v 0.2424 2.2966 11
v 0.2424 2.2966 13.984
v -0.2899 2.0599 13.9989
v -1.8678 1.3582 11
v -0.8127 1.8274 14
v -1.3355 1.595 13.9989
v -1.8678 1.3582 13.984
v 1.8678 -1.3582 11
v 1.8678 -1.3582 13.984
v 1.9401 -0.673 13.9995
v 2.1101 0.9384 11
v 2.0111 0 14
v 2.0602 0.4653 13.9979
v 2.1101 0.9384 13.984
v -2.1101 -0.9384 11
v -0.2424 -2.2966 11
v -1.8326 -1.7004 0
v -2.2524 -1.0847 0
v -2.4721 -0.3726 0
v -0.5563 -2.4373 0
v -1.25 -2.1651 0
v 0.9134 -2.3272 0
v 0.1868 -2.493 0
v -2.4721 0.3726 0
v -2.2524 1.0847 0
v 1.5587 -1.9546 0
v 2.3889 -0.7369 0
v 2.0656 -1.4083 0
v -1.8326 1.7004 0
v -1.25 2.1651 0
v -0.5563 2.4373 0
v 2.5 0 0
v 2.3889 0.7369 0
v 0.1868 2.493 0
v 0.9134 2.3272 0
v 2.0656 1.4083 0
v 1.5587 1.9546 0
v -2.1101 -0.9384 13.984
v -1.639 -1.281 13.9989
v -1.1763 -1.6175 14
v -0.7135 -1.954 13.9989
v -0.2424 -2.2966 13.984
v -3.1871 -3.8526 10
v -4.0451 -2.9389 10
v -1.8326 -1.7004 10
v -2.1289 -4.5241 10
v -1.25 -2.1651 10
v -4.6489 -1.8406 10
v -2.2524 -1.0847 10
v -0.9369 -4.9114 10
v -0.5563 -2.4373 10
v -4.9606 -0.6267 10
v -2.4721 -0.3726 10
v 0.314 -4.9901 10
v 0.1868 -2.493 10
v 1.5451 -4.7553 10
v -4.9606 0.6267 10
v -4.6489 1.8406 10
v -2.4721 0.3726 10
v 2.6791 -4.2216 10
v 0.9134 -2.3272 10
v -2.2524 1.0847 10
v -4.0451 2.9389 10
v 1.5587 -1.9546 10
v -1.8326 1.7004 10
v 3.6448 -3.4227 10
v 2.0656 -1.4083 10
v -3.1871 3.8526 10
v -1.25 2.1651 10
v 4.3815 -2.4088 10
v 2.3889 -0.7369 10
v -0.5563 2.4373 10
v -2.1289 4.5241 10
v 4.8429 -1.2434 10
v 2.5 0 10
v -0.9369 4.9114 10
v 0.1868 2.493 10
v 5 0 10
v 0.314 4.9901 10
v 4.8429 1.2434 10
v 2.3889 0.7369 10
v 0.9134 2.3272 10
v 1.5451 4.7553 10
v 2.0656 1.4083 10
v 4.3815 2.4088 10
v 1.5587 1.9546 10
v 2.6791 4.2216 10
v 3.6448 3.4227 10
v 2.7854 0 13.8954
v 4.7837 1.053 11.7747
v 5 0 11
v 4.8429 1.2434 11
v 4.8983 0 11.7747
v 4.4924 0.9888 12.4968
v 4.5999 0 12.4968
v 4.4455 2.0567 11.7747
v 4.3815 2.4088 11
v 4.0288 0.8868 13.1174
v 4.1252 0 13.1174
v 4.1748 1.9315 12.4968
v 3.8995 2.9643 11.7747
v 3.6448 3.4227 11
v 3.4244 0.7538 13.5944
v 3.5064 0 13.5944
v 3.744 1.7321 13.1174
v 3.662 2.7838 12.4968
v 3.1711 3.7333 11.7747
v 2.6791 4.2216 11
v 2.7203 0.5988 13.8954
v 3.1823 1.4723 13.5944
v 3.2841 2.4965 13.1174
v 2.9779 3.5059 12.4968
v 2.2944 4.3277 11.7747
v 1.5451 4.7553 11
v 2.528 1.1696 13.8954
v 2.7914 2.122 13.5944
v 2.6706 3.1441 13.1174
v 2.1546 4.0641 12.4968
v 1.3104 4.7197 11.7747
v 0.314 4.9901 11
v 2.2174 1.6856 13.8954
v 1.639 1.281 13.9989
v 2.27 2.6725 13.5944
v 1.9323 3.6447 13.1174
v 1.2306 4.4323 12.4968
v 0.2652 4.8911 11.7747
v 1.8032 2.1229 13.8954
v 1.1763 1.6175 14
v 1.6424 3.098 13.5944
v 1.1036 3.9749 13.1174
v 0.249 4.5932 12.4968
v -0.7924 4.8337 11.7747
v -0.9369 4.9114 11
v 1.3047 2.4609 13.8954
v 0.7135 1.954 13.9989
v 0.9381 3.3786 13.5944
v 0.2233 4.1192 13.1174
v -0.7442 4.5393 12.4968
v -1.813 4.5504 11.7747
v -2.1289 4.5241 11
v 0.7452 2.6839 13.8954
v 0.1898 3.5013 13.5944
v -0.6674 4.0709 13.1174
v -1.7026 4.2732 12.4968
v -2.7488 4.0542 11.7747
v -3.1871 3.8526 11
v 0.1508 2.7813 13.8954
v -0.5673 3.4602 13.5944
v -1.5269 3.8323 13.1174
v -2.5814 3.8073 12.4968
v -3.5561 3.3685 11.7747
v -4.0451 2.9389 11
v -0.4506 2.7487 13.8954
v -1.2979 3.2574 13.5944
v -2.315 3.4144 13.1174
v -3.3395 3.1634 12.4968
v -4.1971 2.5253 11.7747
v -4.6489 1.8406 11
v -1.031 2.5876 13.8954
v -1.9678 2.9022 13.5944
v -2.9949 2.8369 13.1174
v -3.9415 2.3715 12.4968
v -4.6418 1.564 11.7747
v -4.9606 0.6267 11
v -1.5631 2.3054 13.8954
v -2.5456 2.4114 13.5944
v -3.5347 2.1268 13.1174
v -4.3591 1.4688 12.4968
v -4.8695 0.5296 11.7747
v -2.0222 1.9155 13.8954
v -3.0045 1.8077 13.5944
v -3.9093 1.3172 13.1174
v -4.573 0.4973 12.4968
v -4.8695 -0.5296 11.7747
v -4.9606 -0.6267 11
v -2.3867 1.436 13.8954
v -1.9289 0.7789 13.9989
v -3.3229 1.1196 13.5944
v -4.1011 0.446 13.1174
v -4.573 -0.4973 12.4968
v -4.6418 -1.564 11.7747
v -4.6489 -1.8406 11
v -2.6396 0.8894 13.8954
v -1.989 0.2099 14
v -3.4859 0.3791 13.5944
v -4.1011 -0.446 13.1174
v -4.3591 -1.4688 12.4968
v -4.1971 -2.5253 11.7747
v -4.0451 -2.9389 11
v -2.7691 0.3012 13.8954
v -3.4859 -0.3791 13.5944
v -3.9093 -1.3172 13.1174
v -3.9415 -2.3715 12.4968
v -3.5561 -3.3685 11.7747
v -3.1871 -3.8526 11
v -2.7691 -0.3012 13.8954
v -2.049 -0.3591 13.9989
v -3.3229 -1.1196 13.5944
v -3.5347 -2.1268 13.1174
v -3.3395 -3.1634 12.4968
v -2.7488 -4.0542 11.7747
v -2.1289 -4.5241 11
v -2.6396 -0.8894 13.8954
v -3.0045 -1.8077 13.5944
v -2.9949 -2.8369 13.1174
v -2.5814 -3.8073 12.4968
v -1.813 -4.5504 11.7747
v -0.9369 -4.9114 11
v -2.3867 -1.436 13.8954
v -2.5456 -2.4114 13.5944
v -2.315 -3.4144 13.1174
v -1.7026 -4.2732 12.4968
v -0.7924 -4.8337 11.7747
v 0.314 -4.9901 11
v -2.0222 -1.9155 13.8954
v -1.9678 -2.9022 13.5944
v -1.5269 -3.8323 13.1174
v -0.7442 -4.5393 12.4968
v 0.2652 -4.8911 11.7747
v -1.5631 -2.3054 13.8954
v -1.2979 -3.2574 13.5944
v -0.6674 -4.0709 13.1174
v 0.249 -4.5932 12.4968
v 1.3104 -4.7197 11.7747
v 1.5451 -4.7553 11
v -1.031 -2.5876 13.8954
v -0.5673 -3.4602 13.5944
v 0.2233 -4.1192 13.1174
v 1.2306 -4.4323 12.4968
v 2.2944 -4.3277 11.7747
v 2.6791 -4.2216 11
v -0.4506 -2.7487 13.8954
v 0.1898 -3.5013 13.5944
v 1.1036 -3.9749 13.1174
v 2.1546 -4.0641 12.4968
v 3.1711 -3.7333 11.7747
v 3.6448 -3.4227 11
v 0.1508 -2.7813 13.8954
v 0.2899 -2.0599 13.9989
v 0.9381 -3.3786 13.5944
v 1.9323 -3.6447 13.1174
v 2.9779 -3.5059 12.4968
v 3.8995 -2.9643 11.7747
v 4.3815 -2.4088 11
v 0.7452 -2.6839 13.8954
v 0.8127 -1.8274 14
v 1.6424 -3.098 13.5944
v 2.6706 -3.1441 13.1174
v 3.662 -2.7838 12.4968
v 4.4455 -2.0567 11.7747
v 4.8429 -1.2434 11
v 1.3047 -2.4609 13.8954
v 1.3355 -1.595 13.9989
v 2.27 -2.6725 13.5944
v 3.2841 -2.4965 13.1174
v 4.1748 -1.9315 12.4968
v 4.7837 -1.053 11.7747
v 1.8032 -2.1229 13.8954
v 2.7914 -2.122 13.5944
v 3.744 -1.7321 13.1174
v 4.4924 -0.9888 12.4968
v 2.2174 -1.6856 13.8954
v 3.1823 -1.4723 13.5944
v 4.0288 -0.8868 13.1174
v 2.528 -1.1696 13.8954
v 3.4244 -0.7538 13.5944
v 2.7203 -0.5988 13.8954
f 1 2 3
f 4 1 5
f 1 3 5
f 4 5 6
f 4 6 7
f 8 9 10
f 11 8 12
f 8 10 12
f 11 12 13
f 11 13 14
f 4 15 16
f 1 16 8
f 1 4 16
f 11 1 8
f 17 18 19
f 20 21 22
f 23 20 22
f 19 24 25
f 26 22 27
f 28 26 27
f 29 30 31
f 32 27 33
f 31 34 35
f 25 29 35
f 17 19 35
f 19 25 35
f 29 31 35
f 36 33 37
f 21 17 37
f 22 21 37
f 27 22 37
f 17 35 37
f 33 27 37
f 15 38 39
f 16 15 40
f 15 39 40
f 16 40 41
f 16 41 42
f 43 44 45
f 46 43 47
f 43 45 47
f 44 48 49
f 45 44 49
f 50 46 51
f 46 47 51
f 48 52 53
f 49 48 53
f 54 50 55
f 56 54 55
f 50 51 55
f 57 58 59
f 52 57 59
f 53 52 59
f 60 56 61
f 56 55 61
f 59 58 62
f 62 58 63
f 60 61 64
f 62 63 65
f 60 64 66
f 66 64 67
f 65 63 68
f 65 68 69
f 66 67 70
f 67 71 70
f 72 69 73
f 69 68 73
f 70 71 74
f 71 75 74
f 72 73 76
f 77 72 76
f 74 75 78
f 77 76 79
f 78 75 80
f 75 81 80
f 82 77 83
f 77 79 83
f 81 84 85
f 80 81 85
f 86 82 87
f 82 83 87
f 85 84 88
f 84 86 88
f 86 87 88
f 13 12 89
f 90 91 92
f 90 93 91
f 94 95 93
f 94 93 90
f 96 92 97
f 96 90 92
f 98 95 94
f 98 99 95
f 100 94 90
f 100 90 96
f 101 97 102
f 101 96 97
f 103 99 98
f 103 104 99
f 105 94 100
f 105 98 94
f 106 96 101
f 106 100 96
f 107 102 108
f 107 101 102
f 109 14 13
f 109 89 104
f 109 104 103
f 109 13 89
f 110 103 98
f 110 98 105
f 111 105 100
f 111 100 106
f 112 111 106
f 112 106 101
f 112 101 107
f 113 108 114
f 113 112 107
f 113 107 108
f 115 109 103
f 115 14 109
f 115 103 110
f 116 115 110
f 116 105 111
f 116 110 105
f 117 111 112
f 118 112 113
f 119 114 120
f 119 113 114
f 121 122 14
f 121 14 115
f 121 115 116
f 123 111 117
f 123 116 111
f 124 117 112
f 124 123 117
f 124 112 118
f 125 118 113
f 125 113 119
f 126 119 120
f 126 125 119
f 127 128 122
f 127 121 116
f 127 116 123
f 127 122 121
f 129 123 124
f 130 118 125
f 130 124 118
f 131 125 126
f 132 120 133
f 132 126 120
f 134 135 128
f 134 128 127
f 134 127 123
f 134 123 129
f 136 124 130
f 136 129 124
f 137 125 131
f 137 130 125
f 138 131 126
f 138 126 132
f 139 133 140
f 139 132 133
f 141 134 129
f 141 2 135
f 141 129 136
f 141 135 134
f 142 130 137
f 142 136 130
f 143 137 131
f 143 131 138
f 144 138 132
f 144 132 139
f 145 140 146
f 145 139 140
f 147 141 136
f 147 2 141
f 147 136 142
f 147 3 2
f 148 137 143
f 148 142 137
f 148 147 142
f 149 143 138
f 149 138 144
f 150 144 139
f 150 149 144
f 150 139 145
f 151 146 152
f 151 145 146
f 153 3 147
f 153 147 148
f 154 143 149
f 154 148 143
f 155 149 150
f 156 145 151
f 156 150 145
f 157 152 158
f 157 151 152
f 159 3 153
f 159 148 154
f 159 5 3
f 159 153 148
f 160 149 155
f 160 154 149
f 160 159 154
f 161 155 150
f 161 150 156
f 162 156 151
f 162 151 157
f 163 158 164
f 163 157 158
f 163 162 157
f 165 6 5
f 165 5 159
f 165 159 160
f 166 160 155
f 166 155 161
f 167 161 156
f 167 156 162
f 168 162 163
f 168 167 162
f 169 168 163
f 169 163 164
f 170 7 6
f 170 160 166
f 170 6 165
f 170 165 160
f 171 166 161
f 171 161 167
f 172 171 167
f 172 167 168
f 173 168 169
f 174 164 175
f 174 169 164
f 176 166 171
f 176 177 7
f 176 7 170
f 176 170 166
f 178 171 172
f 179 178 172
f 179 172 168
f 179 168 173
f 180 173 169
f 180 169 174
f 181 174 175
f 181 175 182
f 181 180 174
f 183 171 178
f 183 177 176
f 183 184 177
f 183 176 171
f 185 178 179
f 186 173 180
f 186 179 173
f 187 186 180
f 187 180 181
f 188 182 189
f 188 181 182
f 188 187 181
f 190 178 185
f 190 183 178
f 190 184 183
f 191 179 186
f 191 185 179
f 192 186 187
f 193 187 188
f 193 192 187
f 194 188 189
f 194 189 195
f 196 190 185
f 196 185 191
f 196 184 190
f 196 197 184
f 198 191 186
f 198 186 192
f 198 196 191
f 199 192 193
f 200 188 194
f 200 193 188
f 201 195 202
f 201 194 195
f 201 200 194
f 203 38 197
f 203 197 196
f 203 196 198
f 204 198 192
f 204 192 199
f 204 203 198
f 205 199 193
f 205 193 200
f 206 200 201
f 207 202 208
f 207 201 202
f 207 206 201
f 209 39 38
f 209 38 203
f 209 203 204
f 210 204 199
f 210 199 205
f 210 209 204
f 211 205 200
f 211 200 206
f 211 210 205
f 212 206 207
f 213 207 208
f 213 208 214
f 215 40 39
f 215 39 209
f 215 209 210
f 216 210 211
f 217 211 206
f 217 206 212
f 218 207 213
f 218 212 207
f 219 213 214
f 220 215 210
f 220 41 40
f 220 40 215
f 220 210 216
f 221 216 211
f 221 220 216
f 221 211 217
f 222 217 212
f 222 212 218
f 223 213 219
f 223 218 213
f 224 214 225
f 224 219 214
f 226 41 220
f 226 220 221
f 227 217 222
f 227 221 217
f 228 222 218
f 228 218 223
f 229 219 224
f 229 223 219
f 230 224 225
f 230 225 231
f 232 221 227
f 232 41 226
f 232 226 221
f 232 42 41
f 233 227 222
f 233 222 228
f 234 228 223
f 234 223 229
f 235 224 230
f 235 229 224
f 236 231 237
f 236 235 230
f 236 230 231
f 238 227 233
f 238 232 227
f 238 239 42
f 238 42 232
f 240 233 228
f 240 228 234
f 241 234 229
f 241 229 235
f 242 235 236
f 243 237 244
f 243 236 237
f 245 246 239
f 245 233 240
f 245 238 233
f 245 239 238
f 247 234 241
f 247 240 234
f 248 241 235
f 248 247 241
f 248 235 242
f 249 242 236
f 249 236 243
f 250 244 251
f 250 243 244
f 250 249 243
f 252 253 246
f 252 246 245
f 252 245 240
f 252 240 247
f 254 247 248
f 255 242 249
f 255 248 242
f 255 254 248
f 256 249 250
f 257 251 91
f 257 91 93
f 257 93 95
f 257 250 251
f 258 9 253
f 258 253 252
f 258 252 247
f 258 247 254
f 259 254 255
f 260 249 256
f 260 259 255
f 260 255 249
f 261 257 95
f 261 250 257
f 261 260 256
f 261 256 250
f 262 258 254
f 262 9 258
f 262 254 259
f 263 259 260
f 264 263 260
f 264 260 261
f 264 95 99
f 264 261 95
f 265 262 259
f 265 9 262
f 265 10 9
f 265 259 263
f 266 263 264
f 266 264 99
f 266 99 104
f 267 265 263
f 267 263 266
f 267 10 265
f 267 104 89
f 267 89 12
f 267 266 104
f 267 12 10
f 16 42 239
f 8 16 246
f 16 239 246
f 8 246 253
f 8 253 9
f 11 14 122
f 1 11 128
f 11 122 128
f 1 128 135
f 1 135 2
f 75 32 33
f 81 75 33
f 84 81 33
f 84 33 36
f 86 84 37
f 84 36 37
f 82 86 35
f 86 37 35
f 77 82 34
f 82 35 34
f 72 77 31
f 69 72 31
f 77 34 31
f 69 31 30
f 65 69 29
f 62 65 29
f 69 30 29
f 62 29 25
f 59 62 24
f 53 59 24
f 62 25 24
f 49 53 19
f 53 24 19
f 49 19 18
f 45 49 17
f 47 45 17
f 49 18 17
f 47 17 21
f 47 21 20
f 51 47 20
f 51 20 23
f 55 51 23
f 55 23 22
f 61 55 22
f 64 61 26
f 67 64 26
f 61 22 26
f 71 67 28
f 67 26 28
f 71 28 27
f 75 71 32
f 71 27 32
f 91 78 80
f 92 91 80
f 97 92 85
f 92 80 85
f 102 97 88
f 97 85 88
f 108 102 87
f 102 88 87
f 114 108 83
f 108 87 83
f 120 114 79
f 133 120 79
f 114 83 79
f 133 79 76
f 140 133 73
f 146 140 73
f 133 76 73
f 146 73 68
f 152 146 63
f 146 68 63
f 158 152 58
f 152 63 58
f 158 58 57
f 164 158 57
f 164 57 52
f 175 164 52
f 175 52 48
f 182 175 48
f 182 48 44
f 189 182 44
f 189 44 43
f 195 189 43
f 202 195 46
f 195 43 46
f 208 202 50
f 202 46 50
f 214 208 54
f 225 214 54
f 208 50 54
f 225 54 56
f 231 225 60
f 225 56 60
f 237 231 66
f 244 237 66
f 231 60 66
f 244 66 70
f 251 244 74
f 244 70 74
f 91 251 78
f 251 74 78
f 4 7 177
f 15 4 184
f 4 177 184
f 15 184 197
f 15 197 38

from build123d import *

# Parameters (mm, degrees)
SKETCH_1_R          = 2.5
EXTRUDE_1_DEPTH     = 10
SKETCH_2_R          = 5
EXTRUDE_2_DEPTH     = 4
FILLET_1_R          = 3
CUT_EXTRUDE_1_DEPTH = 3


with BuildPart() as part:
    # 草图1 → 凸台-拉伸1 (new body)
    with BuildSketch(Plane.XY):
        Circle(SKETCH_1_R)
    extrude(amount=EXTRUDE_1_DEPTH)

    # 草图2 → 凸台-拉伸2 (add)
    with BuildSketch(Plane.XY.offset(10)):
        Circle(SKETCH_2_R)
    extrude(amount=EXTRUDE_2_DEPTH)

    # 圆角1
    fillet_1_edges = [part.edges().sort_by_distance(p)[0] for p in [
        (-5, 0, 14),
    ]]
    fillet(fillet_1_edges, radius=FILLET_1_R)

    # 草图3 → 切除-拉伸1 (cut)
    with BuildSketch(Plane.XY.offset(14)):
        Polygon((-0.242384409, -2.296646061), (1.867761628, -1.358234086), (2.110146037, 0.938411975), (0.242384409, 2.296646061), (-1.867761628, 1.358234086), (-2.110146037, -0.938411975), align=None)
    extrude(amount=-CUT_EXTRUDE_1_DEPTH, mode=Mode.SUBTRACT)


solid = part.part
